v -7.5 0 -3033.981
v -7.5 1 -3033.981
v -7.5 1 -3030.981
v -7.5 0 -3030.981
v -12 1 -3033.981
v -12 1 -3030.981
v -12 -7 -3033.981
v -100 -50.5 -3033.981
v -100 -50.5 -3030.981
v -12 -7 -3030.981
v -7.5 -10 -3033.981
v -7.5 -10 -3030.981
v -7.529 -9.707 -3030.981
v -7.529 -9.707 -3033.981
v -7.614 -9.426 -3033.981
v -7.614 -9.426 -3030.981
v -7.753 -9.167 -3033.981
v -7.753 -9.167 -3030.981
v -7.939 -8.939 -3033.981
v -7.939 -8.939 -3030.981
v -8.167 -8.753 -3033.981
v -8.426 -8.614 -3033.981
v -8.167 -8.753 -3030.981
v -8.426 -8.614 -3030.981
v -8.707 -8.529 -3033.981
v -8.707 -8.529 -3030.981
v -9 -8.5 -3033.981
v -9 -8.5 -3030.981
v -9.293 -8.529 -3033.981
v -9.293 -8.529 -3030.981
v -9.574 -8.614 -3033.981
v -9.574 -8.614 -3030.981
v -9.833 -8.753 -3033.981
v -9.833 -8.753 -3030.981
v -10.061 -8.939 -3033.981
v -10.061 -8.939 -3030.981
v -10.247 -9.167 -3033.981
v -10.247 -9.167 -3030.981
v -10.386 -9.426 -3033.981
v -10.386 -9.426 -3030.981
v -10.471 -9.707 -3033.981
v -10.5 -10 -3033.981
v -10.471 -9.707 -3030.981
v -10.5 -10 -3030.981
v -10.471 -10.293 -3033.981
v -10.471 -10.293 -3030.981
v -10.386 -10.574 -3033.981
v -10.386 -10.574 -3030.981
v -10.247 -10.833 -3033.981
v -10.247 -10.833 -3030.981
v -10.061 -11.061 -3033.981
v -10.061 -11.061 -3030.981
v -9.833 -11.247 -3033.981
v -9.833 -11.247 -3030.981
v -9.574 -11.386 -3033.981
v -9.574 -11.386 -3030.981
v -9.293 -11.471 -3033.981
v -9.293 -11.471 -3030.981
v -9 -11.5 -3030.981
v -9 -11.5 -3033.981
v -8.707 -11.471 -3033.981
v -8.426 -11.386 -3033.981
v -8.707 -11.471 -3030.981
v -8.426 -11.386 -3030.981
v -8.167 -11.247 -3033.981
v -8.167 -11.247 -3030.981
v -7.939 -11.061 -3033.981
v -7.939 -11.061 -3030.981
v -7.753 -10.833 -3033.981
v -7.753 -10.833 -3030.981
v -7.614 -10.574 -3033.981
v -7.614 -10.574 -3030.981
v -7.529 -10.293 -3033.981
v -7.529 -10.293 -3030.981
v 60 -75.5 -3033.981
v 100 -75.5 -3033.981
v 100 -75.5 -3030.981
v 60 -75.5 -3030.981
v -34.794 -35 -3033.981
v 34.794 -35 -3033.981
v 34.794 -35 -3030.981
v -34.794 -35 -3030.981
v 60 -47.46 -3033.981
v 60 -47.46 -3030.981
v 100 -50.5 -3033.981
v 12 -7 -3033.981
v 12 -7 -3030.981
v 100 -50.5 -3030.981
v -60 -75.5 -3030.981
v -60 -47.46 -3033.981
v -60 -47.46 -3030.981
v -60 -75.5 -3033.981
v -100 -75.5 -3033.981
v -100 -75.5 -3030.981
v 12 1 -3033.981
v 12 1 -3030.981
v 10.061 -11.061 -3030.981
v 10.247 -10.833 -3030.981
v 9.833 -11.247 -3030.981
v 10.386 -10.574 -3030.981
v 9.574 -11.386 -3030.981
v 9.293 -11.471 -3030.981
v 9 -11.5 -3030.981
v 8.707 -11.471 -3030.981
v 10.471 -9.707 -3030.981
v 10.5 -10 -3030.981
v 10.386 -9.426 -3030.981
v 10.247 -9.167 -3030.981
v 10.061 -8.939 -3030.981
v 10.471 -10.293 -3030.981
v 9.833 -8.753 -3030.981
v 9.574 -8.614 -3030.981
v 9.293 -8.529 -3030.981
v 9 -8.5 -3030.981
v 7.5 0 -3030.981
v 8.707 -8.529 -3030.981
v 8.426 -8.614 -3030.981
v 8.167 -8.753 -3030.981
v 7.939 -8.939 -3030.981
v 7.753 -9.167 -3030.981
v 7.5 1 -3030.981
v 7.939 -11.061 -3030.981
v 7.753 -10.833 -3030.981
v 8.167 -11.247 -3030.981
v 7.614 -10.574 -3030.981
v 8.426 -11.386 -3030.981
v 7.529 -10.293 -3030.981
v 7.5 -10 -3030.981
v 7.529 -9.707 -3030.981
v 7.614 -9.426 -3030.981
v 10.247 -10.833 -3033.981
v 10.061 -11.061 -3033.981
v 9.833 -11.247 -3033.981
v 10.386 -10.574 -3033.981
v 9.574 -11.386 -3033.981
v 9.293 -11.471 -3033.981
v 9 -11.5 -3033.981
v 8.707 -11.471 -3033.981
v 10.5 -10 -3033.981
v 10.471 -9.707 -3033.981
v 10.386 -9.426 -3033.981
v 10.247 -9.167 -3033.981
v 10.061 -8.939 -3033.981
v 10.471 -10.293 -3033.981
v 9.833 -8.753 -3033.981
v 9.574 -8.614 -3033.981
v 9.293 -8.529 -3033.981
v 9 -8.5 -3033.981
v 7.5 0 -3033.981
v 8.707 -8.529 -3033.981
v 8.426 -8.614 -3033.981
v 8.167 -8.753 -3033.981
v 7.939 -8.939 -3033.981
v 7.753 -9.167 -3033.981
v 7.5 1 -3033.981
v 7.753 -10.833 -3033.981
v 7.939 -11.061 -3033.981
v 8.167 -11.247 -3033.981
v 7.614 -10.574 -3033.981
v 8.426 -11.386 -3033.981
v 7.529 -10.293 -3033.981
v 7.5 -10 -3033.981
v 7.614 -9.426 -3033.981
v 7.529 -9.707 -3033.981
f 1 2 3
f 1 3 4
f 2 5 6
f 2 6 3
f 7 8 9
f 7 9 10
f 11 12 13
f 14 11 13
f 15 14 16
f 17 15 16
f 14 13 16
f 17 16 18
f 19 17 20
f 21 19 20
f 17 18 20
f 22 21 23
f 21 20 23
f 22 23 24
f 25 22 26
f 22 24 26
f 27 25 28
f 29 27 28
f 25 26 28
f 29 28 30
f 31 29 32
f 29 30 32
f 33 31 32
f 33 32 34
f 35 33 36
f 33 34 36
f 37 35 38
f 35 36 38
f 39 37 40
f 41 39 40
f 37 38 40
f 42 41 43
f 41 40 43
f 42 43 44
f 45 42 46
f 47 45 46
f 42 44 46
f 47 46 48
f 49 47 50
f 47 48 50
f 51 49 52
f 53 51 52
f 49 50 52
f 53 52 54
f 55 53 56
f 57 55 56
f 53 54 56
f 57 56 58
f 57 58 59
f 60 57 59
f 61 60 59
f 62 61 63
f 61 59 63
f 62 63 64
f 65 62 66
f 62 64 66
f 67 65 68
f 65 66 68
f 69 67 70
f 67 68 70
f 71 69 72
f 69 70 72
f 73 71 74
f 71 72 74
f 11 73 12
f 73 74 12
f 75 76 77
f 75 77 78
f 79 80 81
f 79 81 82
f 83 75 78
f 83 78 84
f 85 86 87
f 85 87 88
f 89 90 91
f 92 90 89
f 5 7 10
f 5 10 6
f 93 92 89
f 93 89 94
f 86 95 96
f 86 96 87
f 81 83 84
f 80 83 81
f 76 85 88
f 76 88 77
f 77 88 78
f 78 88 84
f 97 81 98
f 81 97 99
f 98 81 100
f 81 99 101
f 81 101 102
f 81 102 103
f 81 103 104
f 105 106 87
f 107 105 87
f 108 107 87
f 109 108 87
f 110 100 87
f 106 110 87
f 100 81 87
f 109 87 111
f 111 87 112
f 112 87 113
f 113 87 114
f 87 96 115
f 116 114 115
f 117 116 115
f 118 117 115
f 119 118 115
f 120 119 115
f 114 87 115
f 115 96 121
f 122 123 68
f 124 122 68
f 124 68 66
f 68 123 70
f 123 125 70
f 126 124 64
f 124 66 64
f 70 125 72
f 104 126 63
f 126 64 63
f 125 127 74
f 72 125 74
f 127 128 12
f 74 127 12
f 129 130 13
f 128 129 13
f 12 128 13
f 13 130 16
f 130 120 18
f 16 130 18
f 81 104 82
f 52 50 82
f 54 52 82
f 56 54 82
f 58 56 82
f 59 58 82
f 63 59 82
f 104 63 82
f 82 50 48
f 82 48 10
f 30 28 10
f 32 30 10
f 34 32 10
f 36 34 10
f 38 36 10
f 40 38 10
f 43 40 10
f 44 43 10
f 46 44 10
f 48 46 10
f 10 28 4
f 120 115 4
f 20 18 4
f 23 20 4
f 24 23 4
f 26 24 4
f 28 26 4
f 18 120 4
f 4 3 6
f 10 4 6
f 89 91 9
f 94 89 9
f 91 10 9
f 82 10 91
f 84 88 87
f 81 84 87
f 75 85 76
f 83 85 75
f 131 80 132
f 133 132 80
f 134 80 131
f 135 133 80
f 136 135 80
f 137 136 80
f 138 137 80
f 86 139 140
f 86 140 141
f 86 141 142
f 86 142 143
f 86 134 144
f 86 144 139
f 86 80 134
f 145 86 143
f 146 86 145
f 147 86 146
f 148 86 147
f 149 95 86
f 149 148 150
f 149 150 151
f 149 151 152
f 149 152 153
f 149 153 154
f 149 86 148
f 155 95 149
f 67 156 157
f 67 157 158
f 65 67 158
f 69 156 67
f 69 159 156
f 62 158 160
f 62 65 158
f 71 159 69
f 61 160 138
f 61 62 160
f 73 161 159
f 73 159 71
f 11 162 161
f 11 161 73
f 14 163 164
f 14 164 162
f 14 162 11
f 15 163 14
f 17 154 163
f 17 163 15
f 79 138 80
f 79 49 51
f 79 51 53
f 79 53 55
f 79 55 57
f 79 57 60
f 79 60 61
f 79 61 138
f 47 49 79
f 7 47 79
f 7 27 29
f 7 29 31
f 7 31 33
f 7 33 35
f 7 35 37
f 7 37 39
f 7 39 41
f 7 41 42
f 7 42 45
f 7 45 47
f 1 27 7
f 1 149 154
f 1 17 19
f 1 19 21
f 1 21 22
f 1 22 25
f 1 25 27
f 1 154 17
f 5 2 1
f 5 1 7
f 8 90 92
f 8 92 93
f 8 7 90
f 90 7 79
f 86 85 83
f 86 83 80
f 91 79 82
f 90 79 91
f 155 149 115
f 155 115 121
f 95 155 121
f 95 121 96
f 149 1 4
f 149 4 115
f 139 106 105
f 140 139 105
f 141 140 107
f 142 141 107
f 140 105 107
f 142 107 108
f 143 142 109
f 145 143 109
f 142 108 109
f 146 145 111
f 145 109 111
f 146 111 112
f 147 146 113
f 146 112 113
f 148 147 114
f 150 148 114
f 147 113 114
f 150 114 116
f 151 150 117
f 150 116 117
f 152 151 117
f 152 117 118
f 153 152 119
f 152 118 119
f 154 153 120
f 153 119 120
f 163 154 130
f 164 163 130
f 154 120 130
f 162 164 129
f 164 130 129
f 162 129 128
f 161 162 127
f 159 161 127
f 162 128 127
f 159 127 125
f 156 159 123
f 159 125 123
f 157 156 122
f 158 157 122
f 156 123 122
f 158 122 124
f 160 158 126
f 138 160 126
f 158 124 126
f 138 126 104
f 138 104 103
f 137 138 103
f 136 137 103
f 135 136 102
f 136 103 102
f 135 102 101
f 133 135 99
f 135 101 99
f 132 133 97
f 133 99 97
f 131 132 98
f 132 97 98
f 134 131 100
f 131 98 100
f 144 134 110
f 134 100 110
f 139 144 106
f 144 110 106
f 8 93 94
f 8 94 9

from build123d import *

# Parameters (mm, degrees)
EXTRUDE_1_DEPTH     = 3
SKETCH_3_R          = 1.5
CUT_EXTRUDE_1_DEPTH = 3


with BuildPart() as part:
    # 草图2 → 凸台-拉伸1 (new body)
    with BuildSketch(Plane(origin=(356.17996861, -2895.528235046, -3033.98121825), x_dir=(1, 0, 0), z_dir=(0, 0, 1))):
        Polygon((-296.17996861, 2848.06839364), (-321.386084558, 2860.528235046), (-390.973852662, 2860.528235046), (-416.17996861, 2848.06839364), (-416.17996861, 2820.028235046), (-456.17996861, 2820.028235046), (-456.17996861, 2845.028235046), (-368.17996861, 2888.528235046), (-368.17996861, 2896.528235046), (-363.67996861, 2896.528235046), (-363.67996861, 2895.528235046), (-348.67996861, 2895.528235046), (-348.67996861, 2896.528235046), (-344.17996861, 2896.528235046), (-344.17996861, 2888.528235046), (-256.17996861, 2845.028235046), (-256.17996861, 2820.028235046), (-296.17996861, 2820.028235046), align=None)
    extrude(amount=EXTRUDE_1_DEPTH)

    # 草图3 → 切除-拉伸1 (cut)
    with BuildSketch(Plane.XY.offset(-3030.98121825)):
        with Locations((9, -10)):
            Circle(SKETCH_3_R)
        with Locations((-9, -10)):
            Circle(SKETCH_3_R)
    extrude(amount=-CUT_EXTRUDE_1_DEPTH, mode=Mode.SUBTRACT)


solid = part.part
